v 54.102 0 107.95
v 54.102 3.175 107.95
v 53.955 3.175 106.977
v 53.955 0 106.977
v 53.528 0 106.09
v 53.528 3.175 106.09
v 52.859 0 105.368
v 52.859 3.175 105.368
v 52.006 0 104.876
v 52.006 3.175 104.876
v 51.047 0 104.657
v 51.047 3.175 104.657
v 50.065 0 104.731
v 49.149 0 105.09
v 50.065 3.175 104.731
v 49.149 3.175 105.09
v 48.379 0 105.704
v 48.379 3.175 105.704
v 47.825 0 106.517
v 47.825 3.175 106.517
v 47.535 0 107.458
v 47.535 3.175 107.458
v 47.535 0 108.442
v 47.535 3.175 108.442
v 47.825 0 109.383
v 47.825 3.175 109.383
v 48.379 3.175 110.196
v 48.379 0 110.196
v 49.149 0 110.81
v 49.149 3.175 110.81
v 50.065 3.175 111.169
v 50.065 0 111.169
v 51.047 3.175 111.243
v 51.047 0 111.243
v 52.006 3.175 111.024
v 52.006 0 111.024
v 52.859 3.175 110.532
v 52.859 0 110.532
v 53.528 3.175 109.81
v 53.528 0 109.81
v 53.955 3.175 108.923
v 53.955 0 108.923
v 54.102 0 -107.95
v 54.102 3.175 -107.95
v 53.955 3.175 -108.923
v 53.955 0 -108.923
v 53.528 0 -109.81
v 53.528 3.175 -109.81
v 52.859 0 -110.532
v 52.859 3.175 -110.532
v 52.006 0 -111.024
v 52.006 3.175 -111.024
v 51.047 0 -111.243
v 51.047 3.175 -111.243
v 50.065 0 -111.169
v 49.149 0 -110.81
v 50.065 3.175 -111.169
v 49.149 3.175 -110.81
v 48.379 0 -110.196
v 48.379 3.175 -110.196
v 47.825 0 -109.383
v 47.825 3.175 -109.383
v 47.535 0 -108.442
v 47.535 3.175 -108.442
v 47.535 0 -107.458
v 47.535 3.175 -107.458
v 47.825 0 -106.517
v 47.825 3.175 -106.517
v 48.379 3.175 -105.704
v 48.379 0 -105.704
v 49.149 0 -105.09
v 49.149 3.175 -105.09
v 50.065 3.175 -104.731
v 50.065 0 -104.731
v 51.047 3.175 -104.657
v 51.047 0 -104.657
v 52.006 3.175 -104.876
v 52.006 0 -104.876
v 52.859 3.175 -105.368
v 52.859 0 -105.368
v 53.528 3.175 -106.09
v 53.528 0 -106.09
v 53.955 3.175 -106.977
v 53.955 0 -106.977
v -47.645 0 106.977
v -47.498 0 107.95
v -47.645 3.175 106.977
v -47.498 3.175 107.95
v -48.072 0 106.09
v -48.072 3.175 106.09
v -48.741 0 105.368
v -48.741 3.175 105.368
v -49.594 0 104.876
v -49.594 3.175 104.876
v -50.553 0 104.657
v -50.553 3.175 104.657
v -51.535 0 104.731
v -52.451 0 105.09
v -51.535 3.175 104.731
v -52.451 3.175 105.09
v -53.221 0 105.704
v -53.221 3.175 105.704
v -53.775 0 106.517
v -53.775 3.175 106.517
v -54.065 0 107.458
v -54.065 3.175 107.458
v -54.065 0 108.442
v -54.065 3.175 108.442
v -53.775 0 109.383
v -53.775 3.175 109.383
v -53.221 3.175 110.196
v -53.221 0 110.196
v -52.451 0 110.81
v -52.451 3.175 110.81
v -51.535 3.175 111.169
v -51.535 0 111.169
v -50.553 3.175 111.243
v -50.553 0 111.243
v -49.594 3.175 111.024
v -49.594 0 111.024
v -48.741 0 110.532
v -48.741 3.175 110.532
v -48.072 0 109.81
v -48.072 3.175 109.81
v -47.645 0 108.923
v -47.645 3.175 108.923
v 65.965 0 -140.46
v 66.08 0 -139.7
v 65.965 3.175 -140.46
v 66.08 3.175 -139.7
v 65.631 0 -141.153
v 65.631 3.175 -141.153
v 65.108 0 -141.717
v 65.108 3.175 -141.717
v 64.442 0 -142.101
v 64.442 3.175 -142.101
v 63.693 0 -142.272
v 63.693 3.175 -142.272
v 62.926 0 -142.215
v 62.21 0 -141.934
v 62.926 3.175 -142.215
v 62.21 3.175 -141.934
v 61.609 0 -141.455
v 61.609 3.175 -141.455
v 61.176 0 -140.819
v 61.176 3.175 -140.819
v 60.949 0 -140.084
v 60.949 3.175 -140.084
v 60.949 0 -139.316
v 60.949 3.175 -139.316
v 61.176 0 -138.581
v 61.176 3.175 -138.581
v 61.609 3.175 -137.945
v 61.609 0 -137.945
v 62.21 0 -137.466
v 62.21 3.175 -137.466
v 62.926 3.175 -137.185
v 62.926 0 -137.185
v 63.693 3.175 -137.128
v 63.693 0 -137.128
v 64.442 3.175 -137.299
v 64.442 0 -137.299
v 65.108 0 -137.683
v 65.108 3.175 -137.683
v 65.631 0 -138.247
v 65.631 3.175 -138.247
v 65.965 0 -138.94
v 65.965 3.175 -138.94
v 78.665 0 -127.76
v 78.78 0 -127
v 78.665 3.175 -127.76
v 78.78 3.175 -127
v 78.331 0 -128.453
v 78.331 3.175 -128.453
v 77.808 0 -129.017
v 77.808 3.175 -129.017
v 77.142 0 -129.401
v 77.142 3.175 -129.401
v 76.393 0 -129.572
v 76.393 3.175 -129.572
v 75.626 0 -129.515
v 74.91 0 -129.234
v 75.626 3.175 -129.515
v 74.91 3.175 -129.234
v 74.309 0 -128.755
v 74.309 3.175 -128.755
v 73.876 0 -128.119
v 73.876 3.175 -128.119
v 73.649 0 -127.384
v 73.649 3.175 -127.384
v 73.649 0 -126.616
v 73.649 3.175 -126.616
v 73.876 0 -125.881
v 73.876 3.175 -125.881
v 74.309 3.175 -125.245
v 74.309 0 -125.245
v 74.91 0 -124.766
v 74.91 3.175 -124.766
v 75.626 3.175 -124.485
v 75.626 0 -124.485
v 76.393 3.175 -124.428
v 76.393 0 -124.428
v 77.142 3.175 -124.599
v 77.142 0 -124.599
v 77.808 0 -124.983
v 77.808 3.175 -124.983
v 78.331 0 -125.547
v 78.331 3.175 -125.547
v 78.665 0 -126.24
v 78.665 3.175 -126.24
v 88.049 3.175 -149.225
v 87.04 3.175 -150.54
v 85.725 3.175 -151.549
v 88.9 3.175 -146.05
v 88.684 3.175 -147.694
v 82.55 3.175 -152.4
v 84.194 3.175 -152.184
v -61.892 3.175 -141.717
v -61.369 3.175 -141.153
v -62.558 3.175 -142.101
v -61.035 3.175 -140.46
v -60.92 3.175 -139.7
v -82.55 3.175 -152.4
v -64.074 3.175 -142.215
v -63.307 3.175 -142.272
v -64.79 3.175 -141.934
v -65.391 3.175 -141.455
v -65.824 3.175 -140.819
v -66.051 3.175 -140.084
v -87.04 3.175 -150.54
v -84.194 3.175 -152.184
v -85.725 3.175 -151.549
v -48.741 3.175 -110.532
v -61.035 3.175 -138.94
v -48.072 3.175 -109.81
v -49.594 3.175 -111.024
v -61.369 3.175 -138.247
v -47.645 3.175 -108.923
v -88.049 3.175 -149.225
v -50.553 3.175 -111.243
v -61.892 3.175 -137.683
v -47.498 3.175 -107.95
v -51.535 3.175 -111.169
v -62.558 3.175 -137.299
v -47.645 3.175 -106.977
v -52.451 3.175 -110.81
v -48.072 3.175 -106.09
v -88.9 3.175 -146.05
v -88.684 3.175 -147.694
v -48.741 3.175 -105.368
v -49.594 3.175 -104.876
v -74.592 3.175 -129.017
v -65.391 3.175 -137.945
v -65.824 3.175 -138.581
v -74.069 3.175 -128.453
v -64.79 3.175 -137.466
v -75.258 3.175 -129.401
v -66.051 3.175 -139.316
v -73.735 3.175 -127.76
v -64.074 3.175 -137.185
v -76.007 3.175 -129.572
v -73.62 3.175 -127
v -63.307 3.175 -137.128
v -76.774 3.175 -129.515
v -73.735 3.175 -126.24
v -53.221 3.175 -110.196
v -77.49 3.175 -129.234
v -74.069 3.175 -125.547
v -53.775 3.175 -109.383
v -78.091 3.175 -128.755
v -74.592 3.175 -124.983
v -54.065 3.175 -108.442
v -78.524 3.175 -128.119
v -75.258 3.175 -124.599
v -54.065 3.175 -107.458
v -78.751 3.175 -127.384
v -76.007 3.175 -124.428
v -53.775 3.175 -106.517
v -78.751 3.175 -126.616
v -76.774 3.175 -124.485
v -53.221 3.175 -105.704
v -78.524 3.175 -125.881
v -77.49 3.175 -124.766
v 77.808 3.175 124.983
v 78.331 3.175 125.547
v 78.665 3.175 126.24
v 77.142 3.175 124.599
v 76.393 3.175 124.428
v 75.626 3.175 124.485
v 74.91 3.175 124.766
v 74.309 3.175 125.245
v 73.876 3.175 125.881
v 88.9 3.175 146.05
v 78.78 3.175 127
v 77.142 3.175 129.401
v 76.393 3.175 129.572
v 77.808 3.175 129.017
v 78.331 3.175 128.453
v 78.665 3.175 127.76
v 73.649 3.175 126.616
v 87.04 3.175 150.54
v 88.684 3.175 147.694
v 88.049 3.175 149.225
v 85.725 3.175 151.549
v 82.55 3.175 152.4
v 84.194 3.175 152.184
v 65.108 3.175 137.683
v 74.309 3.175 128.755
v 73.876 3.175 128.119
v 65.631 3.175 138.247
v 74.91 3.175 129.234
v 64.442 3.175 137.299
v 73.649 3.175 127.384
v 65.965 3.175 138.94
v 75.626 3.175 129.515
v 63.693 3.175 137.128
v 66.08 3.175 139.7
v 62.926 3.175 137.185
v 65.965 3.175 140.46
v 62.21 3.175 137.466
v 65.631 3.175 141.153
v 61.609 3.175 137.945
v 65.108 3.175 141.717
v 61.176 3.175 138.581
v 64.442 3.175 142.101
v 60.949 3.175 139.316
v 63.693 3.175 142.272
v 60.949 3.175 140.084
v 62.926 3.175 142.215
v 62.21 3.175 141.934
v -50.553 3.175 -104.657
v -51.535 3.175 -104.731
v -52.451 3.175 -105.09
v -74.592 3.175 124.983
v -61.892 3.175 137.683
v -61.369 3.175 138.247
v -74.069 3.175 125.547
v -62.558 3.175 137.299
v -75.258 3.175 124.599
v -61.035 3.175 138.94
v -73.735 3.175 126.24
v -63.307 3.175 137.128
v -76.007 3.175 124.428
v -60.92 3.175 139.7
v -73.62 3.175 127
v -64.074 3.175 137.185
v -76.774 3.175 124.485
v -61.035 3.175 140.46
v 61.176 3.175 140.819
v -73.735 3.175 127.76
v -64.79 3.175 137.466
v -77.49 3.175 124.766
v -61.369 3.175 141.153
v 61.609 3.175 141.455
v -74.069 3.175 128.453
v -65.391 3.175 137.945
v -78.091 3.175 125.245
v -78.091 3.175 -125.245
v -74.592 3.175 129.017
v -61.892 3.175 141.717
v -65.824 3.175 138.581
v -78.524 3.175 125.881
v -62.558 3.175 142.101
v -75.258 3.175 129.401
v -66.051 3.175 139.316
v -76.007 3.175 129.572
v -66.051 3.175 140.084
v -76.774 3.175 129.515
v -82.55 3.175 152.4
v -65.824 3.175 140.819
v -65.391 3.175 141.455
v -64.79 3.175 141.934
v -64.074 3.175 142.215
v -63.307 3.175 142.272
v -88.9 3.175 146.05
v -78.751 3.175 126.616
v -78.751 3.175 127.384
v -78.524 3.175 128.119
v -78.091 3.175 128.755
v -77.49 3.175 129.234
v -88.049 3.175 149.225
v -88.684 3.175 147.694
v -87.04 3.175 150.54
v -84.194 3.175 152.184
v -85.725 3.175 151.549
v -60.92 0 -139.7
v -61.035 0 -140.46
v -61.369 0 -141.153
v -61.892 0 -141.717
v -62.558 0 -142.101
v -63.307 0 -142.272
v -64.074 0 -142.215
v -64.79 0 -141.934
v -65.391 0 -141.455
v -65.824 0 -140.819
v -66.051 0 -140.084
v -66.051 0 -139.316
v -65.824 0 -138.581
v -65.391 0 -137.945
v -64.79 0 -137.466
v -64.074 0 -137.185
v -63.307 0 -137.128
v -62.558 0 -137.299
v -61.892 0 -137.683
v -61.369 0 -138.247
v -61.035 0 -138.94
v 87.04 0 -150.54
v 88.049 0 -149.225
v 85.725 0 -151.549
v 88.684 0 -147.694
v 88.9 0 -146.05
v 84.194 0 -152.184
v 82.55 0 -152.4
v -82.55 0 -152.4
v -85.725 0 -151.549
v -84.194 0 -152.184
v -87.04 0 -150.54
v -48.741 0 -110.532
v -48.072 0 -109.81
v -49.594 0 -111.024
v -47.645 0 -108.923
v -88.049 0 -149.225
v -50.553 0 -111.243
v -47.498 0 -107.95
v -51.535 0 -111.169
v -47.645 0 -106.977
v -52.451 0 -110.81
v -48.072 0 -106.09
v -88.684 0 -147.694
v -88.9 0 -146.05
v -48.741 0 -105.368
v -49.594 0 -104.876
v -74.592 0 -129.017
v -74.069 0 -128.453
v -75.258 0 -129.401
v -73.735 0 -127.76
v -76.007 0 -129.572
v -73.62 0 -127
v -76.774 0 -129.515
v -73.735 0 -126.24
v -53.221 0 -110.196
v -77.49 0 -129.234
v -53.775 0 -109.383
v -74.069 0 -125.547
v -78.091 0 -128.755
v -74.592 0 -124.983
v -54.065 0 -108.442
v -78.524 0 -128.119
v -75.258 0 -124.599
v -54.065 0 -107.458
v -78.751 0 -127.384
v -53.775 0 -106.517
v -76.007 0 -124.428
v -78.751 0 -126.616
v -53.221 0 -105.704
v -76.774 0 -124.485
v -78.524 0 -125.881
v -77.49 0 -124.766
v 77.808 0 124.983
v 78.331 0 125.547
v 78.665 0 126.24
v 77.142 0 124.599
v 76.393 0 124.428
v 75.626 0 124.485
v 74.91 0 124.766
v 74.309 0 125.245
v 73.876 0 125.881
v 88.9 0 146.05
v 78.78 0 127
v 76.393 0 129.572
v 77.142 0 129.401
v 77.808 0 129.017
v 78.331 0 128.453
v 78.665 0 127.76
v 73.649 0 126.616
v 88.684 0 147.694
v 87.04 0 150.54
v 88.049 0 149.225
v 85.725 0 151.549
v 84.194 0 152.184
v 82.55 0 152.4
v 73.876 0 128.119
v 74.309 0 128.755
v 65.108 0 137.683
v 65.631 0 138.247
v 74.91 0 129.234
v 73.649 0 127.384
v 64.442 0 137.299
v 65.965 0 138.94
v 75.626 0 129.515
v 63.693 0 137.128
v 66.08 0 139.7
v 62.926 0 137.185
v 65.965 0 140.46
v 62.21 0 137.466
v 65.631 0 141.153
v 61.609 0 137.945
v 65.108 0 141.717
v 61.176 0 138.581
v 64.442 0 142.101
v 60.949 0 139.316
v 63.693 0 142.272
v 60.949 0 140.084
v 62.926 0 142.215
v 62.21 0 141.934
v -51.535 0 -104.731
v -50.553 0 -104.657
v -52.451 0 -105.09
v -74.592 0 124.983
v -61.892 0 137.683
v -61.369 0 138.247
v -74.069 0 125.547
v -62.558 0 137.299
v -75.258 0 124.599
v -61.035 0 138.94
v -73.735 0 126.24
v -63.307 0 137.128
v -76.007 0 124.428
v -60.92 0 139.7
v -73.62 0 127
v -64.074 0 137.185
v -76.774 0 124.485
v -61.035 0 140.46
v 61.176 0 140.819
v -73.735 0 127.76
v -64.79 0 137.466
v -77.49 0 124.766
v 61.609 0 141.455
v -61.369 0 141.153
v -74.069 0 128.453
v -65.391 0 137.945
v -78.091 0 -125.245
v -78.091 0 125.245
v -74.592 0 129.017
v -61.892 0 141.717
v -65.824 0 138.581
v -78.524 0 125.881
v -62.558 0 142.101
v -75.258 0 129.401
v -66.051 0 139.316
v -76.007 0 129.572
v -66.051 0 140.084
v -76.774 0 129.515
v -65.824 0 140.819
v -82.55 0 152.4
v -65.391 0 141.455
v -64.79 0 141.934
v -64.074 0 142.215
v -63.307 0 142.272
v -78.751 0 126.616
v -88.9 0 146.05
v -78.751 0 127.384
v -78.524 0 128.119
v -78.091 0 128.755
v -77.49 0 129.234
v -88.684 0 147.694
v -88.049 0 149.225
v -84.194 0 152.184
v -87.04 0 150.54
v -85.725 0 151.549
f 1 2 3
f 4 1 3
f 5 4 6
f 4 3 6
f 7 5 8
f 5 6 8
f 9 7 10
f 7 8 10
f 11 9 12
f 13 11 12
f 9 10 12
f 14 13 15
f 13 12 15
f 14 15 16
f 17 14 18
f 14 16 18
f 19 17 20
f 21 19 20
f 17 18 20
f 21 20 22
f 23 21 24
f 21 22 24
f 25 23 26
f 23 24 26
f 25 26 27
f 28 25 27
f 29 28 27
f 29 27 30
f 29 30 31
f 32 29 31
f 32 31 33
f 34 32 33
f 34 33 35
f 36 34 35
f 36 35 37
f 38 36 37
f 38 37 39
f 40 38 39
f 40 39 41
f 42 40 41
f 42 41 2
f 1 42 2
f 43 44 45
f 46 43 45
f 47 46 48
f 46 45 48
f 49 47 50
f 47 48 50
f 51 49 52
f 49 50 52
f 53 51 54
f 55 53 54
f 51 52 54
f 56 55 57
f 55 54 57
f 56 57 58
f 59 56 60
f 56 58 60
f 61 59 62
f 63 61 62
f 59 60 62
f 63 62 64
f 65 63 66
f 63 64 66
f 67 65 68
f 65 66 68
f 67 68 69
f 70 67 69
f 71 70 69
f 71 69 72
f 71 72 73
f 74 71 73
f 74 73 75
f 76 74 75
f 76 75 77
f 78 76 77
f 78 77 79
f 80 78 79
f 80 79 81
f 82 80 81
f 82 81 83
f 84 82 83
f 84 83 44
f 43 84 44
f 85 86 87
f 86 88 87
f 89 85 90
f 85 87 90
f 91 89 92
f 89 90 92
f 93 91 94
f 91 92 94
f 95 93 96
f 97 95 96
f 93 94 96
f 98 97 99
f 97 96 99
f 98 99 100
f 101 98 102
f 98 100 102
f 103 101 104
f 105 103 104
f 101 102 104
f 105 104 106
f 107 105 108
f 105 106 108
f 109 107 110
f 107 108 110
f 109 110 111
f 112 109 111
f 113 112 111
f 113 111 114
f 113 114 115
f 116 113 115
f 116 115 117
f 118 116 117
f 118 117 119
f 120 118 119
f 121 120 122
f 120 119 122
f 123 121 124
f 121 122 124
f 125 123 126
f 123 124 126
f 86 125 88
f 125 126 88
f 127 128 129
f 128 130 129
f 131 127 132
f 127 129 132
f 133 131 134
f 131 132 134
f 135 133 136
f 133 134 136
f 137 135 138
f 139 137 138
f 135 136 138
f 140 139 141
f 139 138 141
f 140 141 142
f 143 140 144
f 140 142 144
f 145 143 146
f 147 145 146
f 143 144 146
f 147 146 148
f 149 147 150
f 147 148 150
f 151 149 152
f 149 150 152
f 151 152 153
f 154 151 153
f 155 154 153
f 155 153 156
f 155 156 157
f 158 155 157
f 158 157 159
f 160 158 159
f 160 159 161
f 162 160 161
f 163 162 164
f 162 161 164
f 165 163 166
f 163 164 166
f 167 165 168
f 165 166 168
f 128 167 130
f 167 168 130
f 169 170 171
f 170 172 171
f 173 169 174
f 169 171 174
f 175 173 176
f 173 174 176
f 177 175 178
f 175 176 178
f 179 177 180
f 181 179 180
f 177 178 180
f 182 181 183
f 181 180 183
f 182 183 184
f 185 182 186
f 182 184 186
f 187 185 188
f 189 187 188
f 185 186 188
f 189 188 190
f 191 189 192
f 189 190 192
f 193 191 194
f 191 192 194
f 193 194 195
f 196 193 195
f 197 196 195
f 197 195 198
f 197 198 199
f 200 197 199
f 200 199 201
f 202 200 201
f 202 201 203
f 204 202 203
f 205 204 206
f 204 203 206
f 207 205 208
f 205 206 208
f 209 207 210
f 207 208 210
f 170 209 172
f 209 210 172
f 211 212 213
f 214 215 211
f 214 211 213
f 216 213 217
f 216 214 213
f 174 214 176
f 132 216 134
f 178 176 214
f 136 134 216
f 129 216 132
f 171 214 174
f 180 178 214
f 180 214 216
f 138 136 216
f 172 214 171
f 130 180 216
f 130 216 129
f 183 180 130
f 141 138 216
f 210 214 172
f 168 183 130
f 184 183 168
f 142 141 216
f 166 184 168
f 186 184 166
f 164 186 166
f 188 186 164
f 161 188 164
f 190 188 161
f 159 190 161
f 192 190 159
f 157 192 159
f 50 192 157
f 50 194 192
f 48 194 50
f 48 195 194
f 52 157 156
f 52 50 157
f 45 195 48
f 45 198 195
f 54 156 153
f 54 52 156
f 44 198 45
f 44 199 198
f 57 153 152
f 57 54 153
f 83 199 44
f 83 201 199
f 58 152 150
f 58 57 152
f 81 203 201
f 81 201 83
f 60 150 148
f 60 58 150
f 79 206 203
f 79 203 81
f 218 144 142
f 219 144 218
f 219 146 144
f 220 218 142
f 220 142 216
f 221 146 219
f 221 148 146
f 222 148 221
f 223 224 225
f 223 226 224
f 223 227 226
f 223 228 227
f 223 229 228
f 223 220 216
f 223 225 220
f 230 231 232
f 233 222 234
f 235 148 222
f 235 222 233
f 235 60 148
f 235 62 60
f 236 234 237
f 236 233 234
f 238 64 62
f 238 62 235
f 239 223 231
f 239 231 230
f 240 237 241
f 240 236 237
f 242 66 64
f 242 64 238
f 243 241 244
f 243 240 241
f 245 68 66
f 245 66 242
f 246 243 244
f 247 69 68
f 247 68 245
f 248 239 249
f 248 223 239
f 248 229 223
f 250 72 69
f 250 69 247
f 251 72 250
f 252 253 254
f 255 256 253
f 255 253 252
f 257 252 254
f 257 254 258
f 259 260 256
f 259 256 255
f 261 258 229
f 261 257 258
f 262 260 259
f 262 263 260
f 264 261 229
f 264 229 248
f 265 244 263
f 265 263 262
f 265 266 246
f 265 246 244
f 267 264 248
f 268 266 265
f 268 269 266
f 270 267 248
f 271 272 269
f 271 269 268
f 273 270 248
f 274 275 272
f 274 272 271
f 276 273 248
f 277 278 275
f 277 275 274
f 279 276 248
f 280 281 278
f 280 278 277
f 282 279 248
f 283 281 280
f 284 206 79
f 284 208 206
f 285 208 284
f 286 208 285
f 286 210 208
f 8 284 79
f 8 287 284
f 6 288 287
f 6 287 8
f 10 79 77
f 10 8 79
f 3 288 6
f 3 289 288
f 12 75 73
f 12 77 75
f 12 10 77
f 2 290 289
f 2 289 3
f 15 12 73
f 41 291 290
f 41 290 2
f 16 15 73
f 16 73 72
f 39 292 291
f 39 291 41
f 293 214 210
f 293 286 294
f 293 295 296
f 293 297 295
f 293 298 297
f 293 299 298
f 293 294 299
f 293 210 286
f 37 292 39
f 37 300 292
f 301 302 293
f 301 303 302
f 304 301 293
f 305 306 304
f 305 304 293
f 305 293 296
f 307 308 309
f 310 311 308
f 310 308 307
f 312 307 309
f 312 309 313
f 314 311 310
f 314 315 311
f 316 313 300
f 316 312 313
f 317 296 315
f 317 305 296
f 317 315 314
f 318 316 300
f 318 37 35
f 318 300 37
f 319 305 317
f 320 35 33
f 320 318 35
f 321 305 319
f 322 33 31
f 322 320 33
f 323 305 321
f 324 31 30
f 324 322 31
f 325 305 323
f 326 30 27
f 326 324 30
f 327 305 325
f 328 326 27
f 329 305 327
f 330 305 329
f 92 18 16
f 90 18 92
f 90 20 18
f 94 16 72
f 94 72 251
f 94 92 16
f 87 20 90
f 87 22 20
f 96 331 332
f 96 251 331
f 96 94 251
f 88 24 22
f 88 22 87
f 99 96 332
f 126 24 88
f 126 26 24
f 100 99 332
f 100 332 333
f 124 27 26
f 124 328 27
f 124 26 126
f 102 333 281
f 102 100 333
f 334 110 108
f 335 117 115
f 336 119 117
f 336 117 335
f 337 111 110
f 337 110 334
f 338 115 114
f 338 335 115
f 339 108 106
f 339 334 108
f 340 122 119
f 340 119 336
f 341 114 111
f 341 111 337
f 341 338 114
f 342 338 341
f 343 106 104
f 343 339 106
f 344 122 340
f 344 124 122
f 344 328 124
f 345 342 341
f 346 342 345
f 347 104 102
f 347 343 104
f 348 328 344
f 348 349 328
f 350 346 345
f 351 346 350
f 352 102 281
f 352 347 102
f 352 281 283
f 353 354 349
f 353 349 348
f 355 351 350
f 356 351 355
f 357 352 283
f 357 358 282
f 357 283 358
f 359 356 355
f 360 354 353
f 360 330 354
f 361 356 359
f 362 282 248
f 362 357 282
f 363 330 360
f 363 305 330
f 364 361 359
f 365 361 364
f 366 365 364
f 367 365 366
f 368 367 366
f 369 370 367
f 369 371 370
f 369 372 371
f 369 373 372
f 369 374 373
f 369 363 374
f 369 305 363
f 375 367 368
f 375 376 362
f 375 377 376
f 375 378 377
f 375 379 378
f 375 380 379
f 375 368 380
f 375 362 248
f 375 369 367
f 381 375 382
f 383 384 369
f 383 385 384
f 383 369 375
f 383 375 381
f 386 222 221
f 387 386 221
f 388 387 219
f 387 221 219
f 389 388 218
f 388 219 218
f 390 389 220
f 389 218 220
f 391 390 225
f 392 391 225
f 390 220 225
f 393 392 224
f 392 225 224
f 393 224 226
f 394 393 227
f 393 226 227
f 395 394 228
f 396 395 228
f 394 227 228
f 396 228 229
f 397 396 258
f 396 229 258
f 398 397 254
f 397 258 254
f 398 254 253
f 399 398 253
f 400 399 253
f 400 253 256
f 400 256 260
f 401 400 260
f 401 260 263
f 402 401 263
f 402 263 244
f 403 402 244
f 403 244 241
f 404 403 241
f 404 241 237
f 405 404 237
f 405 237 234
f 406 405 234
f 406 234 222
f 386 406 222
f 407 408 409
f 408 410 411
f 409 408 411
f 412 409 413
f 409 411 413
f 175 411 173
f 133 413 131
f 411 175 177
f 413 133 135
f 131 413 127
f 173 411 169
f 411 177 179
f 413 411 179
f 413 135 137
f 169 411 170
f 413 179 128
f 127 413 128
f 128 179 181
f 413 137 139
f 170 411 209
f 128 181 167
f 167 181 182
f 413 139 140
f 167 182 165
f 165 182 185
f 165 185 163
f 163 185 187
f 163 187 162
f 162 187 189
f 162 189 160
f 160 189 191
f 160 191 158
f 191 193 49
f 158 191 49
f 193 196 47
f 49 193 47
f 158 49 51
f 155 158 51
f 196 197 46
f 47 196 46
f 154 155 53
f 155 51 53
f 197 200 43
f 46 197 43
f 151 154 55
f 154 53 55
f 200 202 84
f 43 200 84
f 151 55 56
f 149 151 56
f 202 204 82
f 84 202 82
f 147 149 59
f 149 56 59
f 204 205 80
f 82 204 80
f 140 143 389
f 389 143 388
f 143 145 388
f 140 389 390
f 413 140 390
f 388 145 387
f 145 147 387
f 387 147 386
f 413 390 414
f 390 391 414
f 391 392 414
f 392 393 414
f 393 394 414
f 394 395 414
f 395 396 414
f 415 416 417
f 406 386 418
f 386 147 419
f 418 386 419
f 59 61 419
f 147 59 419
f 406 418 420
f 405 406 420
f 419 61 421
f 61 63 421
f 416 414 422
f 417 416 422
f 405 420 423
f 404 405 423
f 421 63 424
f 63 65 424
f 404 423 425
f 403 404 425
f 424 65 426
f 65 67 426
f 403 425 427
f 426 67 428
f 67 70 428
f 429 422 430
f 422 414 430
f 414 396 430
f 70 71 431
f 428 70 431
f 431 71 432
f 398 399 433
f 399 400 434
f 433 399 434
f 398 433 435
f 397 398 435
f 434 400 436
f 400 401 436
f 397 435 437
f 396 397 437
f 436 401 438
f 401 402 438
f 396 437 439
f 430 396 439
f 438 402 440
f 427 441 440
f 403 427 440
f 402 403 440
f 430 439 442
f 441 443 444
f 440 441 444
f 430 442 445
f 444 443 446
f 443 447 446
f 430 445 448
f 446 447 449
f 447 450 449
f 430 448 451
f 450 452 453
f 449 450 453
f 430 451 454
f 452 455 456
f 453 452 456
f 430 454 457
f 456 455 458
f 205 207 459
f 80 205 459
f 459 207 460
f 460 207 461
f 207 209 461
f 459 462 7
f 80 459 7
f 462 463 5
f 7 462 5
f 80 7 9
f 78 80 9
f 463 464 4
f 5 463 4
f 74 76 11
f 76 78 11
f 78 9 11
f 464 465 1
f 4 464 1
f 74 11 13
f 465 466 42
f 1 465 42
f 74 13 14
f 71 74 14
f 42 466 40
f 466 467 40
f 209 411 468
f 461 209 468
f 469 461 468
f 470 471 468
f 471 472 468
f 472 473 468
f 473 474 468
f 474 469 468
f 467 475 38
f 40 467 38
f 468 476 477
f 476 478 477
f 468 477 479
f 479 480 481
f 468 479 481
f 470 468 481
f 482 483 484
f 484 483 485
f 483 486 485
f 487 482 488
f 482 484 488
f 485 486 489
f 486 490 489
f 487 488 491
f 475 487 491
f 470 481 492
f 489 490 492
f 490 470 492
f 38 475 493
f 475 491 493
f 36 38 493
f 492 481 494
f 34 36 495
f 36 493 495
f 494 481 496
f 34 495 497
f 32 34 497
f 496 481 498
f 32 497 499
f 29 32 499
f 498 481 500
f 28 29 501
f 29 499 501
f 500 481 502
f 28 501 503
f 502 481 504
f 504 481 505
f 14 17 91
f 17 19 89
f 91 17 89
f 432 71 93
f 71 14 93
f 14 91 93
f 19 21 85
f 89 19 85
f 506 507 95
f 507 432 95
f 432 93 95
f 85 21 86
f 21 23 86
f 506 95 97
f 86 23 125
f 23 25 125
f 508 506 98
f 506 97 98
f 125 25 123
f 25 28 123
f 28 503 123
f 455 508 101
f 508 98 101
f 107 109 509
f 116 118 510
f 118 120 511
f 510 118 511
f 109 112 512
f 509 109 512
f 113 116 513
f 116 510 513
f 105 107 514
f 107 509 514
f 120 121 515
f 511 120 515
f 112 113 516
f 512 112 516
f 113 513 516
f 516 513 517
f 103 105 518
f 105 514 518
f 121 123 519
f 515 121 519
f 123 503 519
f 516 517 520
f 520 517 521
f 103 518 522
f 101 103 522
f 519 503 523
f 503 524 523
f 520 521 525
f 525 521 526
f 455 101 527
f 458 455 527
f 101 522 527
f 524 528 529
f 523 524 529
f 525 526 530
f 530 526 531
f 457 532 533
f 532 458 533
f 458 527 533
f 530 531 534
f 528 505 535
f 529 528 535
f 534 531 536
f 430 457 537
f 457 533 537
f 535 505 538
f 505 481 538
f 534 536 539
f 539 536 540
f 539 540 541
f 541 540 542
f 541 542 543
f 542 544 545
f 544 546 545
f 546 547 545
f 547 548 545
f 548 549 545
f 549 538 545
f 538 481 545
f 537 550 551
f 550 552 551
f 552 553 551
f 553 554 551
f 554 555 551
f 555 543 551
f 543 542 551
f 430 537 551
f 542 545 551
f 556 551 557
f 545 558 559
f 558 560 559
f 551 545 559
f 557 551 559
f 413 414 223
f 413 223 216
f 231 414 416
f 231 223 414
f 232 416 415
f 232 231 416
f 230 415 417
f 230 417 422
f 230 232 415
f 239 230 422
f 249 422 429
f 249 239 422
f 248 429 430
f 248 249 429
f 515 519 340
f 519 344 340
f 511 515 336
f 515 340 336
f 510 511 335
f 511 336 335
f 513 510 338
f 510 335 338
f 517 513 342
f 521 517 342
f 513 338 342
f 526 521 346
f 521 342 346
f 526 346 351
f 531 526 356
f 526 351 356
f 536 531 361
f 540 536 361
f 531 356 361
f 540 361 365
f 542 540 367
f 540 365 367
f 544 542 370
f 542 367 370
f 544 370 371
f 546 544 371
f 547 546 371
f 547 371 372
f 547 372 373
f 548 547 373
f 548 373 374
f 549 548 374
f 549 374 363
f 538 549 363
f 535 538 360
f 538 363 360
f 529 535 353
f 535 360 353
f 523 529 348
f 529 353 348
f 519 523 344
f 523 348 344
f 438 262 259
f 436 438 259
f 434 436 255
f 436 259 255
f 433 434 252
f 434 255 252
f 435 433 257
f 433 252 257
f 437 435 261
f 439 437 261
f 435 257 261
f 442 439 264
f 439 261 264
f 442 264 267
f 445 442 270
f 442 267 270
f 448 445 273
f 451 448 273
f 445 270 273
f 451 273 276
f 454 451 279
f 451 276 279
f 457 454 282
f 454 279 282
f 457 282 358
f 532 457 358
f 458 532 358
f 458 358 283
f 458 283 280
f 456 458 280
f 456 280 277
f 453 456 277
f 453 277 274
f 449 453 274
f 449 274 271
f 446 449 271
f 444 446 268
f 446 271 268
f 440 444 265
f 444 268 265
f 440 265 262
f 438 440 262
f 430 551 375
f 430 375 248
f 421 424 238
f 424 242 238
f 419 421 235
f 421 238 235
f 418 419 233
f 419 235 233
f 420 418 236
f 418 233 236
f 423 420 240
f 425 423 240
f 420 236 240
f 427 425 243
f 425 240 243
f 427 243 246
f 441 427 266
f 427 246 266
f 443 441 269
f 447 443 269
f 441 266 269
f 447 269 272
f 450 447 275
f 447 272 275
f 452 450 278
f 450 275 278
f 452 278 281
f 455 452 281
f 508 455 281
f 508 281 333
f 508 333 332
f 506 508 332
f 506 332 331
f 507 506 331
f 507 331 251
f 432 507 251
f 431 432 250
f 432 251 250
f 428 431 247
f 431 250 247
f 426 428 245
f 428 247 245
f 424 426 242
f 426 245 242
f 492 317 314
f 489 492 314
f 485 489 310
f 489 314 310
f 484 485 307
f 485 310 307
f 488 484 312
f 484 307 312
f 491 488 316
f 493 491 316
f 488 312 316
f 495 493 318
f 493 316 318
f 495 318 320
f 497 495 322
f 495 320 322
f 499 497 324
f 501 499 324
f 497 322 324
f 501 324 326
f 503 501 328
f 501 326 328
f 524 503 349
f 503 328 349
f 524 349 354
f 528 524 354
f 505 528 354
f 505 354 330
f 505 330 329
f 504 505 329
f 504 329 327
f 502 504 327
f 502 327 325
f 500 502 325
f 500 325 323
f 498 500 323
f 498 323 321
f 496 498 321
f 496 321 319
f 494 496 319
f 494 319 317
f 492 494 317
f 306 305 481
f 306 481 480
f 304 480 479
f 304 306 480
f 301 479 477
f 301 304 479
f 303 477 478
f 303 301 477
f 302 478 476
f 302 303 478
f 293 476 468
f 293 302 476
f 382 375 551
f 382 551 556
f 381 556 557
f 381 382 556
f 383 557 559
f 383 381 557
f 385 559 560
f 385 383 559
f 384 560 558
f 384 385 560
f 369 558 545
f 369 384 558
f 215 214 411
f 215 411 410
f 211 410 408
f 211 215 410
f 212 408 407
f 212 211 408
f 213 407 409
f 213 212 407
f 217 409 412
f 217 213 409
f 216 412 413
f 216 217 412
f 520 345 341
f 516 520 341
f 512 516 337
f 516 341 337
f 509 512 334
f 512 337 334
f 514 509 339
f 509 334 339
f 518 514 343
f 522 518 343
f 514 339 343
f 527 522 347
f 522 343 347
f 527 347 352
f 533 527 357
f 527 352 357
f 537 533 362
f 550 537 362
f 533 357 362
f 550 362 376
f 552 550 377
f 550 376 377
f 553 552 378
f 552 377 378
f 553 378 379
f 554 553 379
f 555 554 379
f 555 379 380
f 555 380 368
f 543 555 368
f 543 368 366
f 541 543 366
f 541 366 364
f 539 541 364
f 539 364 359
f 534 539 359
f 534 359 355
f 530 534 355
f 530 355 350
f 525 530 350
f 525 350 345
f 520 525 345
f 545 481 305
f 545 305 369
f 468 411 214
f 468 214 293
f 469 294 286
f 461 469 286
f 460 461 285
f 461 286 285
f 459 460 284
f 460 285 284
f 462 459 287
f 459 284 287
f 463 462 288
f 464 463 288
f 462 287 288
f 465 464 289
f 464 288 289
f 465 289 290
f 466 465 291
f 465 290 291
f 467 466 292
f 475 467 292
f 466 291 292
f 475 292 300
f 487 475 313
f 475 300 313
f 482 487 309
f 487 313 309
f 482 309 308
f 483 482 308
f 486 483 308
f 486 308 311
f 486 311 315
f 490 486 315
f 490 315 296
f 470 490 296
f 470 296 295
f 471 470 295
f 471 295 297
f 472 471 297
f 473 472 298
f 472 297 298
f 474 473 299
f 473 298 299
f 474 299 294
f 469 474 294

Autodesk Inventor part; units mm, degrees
ref_plane "YZ Plane" through (0, 0, 0) normal (1, 0, 0) x (0, 1, 0)
ref_plane "XZ Plane" through (0, 0, 0) normal (0, 1, 0) x (-1, 0, 0)
ref_plane "XY Plane" through (0, 0, 0) normal (0, 0, 1) x (1, 0, 0)
sketch "Sketch1" plane through (0, 0, 0) normal (0, 1, 0) x (-1, 0, 0)
  line L0 (88.9, -152.4) -> (-88.9, -152.4)
  line L1 (-88.9, -152.4) -> (-88.9, 152.4)
  line L2 (-88.9, 152.4) -> (88.9, 152.4)
  line L3 (88.9, 152.4) -> (88.9, -152.4)
  line L4 (88.9, -152.4) -> (-88.9, 152.4) construction
  line L5 (-88.9, -152.4) -> (88.9, 152.4) construction
  point P0 (0, 0)
  dimension "d0" = 177.8
  dimension "d1" = 304.8
extrude "Plate1" add sketch "Sketch1" along normal blind 3.175
fillet "Corner Round1" radius 6.35 4 edges at (-88.9, 1.5875, 152.4) (88.9, 1.5875, 152.4) (-88.9, 1.5875, -152.4) (88.9, 1.5875, -152.4)
sketch "Sketch2" plane through (0, 3.175, 0) normal (0, 1, 0) x (1, 0, 0)
  circle A0 centre (-76.2, 127) radius 2.5797
  line L0 (-88.9, -146.05) -> (-88.9, 146.05) projected
  line L1 (-82.55, 152.4) -> (82.55, 152.4) projected
  circle A1 centre (-63.5, 139.7) radius 2.5797
  line L2 (-88.9, 0) -> (88.9, 0) construction
  line L3 (88.9, 146.05) -> (88.9, -146.05) construction
  line L4 (-82.55, 152.4) -> (82.55, 152.4) construction
  line L5 (0, 152.4) -> (0, -152.4) construction
  line L6 (82.55, -152.4) -> (-82.55, -152.4) construction
  circle A2 centre (76.2, 127) radius 2.5797
  circle A3 centre (63.5, 139.7) radius 2.5797
  circle A4 centre (-76.2, -127) radius 2.5797
  circle A5 centre (-63.5, -139.7) radius 2.5797
  circle A6 centre (63.5, -139.7) radius 2.5797
  circle A7 centre (76.2, -127) radius 2.5797
  circle A8 centre (-50.8, 107.95) radius 3.302
  line L7 (-50.8, 107.95) -> (50.8, 107.95) construction
  circle A9 centre (50.8, 107.95) radius 3.302
  line L8 (50.8, 107.95) -> (50.8, -107.95) construction
  circle A10 centre (50.8, -107.95) radius 3.302
  line L9 (50.8, -107.95) -> (-50.8, -107.95) construction
  circle A11 centre (-50.8, -107.95) radius 3.302
  line L10 (-50.8, 107.95) -> (-50.8, -107.95) construction
  point P0 (0, 0)
  point P1 (0, 107.95)
  point P2 (-50.8, 0)
  dimension "d4" = 5.1594
  dimension "d5" = 12.7
  dimension "d6" = 25.4
  dimension "d7" = 12.7
  dimension "d8" = 25.4
  dimension "d11" = 101.6
  dimension "d12" = 6.604
  dimension "d13" = 215.9
extrude "Cut1" cut sketch "Sketch2" against normal blind 3.175
equation "\"d9\" = Thickness"
equation "\"d2\" = Thickness"
equation "\"BendRadius\" = 1.5 * Thickness"
equation "\"BendReliefWidth\" = Thickness"
equation "\"BendReliefDepth\" = 0.5 * Thickness"
equation "\"CornerReliefSize\" = 4 * Thickness"
equation "\"MinimumRemnant\" = 2 * Thickness"
equation "\"TransitionRadius\" = BendRadius"
equation "\"JacobiRadiusSize\" = BendRadius"
equation "\"GapSize\" = Thickness"
equation "\"Thickness\" = 3.175"
properties part number "PDP_Plate" material "Aluminum 5052 H32"
